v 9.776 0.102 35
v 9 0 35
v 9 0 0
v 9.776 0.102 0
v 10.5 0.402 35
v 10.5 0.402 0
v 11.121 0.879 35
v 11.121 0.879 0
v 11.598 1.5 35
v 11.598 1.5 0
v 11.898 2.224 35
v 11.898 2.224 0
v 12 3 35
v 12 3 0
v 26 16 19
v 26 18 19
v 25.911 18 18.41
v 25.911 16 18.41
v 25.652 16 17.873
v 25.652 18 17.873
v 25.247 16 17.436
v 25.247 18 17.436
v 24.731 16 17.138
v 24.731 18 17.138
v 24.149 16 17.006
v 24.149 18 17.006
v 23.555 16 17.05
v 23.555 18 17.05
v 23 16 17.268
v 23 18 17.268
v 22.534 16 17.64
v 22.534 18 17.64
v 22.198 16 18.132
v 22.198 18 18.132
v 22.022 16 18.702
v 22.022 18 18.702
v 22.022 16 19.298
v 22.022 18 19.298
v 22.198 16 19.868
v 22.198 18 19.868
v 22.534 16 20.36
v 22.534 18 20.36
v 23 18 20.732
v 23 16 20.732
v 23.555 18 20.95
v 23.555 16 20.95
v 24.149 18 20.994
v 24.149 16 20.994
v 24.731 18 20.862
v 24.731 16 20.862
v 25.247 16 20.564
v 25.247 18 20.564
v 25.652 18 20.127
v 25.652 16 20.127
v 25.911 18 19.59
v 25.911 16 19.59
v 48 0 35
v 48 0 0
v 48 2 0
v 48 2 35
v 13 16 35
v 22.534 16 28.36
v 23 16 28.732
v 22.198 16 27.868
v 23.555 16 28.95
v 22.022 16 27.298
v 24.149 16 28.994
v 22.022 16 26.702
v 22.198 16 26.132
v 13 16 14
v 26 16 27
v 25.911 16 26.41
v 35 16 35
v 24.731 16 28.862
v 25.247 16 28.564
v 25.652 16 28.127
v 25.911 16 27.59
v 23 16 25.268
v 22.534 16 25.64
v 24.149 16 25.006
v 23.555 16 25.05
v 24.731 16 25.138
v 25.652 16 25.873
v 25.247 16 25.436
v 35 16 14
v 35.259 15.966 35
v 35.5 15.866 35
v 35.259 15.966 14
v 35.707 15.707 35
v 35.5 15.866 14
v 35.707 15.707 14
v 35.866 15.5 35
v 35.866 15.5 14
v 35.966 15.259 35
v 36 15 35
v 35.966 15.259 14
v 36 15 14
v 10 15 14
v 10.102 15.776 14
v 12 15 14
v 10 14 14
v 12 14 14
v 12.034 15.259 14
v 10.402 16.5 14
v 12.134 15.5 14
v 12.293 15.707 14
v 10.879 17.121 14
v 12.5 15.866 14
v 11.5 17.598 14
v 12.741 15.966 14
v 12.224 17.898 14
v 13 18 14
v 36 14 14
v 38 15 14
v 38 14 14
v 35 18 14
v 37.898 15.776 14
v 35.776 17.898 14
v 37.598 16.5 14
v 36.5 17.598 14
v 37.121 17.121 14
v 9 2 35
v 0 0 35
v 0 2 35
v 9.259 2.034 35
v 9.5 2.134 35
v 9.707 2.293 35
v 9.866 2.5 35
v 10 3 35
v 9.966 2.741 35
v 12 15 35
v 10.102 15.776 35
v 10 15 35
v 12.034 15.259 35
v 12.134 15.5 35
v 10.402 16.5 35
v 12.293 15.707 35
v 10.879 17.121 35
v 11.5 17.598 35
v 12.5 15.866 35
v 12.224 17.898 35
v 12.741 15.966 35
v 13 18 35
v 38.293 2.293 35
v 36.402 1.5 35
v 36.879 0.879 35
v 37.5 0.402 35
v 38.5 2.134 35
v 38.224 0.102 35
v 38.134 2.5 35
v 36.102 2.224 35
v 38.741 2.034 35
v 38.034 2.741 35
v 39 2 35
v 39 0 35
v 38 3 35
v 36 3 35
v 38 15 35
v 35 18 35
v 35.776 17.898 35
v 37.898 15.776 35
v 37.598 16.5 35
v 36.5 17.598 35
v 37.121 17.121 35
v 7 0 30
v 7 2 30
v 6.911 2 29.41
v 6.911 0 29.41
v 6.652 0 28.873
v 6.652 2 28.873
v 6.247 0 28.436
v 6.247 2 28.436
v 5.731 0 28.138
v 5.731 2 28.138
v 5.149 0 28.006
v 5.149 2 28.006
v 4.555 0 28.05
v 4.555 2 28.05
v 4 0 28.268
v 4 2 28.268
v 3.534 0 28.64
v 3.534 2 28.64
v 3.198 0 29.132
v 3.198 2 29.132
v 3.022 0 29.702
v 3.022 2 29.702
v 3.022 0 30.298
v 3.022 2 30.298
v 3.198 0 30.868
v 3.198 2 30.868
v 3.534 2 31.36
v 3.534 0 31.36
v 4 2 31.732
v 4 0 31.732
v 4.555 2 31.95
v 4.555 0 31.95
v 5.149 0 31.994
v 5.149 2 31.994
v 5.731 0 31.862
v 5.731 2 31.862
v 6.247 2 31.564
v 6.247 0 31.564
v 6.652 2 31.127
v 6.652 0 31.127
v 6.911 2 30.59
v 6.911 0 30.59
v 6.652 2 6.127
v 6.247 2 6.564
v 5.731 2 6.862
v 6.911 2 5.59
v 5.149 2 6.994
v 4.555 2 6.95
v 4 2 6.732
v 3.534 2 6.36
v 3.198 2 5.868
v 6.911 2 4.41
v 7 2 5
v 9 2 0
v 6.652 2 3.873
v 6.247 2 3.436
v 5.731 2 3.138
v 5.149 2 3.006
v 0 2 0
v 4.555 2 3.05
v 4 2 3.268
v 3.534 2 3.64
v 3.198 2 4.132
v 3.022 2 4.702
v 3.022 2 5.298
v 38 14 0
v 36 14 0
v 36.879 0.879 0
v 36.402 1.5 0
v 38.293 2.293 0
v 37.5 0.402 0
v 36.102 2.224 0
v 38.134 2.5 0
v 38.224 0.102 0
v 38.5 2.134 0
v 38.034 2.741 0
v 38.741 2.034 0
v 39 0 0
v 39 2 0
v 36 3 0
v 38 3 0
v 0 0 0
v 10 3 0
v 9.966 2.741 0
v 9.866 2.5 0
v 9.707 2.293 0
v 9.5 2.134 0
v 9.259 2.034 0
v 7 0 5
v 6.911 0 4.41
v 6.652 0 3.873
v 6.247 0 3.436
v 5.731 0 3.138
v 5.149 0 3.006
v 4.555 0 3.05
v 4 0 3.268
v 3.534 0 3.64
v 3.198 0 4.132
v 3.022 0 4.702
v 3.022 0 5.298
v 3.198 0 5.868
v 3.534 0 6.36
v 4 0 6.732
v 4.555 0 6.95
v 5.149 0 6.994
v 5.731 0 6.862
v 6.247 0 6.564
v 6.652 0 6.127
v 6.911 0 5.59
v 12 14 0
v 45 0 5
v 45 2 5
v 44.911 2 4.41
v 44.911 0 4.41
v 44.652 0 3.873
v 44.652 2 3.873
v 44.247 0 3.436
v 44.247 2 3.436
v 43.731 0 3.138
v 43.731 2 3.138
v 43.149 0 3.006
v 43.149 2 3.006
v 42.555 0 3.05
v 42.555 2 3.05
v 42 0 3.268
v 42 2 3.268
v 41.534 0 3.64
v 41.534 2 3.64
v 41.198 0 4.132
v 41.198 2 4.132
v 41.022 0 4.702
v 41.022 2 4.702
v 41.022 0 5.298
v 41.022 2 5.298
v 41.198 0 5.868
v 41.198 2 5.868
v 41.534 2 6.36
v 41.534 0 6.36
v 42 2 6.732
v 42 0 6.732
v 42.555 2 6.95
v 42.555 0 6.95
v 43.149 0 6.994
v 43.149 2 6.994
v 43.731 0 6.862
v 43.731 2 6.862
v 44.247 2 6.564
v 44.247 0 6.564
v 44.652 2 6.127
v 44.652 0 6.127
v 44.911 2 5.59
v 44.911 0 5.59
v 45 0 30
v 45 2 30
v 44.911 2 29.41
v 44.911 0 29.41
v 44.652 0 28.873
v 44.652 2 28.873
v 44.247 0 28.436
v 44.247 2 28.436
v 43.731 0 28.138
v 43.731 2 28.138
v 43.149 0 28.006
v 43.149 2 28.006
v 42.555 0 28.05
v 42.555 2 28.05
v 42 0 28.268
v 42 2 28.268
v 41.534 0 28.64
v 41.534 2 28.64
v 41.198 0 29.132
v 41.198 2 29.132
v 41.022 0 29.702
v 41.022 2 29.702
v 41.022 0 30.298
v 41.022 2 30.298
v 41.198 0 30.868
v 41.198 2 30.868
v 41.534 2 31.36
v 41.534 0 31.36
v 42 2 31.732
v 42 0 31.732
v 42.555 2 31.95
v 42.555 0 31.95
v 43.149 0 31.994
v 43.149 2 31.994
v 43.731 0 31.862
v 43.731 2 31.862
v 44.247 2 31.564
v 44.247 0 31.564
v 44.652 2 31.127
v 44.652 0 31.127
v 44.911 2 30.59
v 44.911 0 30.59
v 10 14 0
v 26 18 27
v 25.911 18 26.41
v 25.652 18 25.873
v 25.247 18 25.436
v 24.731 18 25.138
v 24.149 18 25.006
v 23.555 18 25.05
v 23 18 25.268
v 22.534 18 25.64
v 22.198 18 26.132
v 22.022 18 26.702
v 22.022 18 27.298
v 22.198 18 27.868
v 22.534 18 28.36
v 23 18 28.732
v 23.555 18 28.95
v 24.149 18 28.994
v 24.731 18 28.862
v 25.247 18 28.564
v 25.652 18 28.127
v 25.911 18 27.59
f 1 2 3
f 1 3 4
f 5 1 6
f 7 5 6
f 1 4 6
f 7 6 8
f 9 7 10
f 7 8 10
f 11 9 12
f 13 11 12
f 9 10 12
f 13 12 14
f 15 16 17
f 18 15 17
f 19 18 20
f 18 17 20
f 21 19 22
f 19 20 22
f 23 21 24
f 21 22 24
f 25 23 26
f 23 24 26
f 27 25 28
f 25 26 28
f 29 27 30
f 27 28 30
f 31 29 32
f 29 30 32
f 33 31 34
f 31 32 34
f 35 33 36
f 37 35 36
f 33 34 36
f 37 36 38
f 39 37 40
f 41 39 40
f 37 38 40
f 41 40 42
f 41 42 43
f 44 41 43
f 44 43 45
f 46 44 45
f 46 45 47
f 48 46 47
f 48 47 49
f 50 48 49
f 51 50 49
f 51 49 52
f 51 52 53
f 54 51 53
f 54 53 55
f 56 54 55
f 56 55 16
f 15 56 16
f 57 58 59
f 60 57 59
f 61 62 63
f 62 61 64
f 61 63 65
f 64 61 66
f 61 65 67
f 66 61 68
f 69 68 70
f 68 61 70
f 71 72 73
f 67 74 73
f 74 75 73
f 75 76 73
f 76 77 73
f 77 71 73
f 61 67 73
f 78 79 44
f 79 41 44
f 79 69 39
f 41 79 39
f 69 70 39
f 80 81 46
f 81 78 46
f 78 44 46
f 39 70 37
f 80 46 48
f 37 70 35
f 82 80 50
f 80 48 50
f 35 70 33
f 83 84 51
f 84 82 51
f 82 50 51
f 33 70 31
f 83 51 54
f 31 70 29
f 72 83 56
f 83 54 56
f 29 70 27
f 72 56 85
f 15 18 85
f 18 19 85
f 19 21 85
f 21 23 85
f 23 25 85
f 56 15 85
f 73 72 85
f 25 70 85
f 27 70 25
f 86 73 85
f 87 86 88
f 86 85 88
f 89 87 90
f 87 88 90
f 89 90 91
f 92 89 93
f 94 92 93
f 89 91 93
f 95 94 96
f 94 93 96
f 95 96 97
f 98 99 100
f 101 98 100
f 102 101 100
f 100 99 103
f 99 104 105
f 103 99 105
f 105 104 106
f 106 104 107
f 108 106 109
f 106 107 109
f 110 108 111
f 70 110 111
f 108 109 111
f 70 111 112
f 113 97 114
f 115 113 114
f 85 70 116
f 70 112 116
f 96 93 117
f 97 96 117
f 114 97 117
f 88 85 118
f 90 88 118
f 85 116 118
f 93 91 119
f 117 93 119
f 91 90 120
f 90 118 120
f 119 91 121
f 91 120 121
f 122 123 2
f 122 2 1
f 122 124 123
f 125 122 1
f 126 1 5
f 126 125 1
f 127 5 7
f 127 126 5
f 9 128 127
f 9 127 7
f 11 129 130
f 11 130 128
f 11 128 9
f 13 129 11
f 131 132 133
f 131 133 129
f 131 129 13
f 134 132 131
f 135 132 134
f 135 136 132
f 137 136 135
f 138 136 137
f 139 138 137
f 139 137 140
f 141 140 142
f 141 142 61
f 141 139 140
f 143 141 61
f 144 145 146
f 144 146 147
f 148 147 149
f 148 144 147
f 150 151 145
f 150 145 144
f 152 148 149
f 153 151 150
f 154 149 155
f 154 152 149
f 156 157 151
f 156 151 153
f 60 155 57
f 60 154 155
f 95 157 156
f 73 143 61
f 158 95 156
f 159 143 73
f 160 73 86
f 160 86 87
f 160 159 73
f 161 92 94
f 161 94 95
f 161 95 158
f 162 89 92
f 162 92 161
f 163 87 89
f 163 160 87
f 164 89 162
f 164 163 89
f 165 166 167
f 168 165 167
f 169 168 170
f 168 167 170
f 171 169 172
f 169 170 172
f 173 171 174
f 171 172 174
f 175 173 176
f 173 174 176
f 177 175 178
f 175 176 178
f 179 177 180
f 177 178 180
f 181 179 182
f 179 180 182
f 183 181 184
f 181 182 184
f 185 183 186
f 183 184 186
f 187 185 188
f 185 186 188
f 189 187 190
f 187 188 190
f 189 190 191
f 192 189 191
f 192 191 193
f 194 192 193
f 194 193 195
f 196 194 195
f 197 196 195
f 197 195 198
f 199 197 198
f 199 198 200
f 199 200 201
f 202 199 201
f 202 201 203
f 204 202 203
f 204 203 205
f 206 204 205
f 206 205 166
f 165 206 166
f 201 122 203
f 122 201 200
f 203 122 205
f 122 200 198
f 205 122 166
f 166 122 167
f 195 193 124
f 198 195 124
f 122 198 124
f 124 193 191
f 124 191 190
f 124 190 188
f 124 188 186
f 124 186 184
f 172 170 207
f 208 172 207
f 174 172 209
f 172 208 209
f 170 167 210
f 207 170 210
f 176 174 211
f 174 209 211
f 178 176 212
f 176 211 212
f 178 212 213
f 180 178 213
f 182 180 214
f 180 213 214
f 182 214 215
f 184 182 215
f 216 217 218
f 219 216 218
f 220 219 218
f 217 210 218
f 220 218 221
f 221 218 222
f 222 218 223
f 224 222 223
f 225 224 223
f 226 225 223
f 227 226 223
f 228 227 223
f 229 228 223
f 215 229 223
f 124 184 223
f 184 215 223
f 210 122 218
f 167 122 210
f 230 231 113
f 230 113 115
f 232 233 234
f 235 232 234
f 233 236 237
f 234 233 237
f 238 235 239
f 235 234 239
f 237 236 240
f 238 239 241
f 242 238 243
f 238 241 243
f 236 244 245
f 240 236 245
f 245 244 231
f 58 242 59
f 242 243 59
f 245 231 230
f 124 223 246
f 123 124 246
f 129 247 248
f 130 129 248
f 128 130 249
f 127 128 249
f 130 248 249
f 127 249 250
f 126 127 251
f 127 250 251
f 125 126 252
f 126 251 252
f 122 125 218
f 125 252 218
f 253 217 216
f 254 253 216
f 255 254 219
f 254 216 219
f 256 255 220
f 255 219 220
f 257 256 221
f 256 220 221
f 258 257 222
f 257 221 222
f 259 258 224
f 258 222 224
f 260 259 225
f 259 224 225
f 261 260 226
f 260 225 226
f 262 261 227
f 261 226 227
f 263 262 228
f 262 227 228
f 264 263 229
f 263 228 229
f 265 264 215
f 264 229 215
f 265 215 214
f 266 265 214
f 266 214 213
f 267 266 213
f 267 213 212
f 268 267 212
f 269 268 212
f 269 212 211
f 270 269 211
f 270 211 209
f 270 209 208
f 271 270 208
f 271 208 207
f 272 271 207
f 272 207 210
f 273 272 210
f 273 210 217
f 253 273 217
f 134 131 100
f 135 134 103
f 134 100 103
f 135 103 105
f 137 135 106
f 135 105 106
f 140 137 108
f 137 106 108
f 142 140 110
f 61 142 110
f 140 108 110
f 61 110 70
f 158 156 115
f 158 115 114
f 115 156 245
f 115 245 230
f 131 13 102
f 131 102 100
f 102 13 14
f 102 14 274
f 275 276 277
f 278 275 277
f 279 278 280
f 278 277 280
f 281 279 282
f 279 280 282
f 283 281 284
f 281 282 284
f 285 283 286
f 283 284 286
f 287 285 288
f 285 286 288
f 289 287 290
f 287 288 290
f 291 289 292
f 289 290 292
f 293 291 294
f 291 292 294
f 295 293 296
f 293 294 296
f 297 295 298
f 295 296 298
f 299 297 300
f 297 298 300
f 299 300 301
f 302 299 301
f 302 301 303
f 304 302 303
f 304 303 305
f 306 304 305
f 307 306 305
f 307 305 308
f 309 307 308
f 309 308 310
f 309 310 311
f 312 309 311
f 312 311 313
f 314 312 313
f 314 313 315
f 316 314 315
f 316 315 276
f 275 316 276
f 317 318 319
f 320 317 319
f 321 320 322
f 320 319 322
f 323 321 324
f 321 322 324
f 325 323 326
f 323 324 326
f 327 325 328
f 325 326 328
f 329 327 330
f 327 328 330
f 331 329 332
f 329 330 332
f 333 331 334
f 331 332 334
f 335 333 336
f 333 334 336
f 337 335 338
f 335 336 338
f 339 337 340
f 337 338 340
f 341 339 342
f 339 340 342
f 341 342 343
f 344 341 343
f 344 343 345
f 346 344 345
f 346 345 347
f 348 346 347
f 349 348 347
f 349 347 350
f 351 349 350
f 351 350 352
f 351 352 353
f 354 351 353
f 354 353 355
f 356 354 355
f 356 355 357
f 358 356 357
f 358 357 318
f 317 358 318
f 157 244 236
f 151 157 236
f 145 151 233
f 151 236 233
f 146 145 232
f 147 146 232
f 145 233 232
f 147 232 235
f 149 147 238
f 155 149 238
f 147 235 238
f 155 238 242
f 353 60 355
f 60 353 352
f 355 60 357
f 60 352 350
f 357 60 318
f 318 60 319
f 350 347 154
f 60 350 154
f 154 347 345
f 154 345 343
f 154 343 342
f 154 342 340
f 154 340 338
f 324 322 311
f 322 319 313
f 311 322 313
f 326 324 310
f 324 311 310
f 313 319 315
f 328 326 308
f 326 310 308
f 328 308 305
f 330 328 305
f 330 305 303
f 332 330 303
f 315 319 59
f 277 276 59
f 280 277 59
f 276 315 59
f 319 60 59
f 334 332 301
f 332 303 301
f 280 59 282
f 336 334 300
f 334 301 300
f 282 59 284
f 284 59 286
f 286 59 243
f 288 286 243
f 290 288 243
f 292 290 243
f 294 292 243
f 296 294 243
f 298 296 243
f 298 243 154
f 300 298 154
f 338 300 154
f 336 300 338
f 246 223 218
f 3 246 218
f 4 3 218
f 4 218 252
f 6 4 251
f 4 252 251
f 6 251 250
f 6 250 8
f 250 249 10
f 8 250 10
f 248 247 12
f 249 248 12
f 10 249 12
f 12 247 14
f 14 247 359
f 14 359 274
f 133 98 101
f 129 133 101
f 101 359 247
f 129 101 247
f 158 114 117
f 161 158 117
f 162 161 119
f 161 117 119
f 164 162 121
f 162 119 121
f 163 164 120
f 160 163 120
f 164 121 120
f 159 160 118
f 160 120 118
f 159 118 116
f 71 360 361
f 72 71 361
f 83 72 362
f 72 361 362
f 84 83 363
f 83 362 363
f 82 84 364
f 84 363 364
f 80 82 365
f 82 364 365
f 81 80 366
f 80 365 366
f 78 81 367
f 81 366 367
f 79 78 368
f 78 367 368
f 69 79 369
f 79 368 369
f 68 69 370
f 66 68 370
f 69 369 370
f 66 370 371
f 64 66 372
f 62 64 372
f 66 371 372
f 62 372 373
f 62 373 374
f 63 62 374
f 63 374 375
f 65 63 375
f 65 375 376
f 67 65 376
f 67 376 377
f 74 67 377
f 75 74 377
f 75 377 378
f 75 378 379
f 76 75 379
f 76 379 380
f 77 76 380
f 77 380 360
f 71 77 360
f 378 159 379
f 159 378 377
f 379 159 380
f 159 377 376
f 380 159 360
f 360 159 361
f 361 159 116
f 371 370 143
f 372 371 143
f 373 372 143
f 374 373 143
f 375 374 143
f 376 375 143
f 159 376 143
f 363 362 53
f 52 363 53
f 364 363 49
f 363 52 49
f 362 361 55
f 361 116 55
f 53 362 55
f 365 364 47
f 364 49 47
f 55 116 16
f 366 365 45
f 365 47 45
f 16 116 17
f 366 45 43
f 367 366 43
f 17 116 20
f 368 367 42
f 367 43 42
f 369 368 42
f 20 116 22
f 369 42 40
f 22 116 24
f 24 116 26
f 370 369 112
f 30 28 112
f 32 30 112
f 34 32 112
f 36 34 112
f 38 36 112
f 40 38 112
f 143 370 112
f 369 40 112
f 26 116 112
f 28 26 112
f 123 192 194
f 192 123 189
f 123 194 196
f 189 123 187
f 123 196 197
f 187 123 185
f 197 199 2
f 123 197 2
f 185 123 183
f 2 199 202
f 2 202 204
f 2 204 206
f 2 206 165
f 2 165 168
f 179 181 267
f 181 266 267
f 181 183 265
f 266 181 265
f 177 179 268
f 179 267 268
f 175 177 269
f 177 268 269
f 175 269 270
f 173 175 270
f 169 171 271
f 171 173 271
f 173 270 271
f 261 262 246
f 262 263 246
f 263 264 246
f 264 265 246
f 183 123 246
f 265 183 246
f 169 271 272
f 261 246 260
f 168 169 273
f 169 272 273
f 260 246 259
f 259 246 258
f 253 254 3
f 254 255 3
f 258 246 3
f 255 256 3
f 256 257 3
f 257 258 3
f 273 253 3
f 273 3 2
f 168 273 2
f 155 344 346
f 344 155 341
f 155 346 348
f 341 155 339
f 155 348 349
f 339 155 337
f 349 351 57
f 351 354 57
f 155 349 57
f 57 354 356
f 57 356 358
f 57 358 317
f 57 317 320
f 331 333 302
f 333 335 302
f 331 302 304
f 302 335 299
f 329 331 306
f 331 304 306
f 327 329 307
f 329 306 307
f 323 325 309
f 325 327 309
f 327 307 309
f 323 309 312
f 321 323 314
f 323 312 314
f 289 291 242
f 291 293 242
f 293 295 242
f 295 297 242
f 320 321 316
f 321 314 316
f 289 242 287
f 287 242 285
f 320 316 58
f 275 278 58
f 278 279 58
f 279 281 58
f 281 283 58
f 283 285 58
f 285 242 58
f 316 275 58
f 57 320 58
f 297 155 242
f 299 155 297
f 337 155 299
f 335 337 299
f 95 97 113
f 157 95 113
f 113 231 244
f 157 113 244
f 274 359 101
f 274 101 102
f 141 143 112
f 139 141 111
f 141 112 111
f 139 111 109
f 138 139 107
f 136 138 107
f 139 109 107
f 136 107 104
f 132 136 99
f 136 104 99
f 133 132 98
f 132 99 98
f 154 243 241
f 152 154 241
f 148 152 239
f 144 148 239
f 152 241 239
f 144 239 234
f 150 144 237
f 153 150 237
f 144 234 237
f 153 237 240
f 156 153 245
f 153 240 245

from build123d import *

# Parameters (mm, degrees)
EXTRUDE_1_DEPTH     = 35
SKETCH_2_W          = 48
SKETCH_2_H          = 14
CUT_EXTRUDE_1_DEPTH = 4
SKETCH_3_R          = 2
CUT_EXTRUDE_2_DEPTH = 19


with BuildPart() as part:
    # Эскиз1 → Бобышка-Вытянуть1 (new body)
    with BuildSketch(Plane.XY):
        with BuildLine():
            Line((0, 0), (9, 0))
            ThreePointArc((9, 0), (11.121320344, 0.878679656), (12, 3))
            Line((12, 3), (12, 15))
            ThreePointArc((12, 15), (12.292893219, 15.707106781), (13, 16))
            Line((13, 16), (35, 16))
            ThreePointArc((35, 16), (35.707106781, 15.707106781), (36, 15))
            Line((36, 15), (36, 3))
            ThreePointArc((36, 3), (36.878679656, 0.878679656), (39, 0))
            Line((39, 0), (48, 0))
            Line((48, 0), (48, 2))
            Line((48, 2), (39, 2))
            ThreePointArc((39, 2), (38.292893219, 2.292893219), (38, 3))
            Line((38, 3), (38, 15))
            ThreePointArc((38, 15), (37.121320344, 17.121320344), (35, 18))
            Line((35, 18), (13, 18))
            ThreePointArc((13, 18), (10.878679656, 17.121320344), (10, 15))
            Line((10, 15), (10, 3))
            ThreePointArc((10, 3), (9.707106781, 2.292893219), (9, 2))
            Line((9, 2), (0, 2))
            Line((0, 2), (0, 0))
        make_face()
    extrude(amount=EXTRUDE_1_DEPTH)

    # Эскиз2 → Вырез-Вытянуть1 (cut)
    with BuildSketch(Plane(origin=(0, 18, 0), x_dir=(1, 0, 0), z_dir=(0, 1, 0))):
        with Locations((24, -7)):
            Rectangle(SKETCH_2_W, SKETCH_2_H)
    extrude(amount=-CUT_EXTRUDE_1_DEPTH, mode=Mode.SUBTRACT)

    # Эскиз3 → Вырез-Вытянуть2 (cut, through all)
    with BuildSketch(Plane(origin=(0, 18, 0), x_dir=(1, 0, 0), z_dir=(0, 1, 0))):
        with Locations((24, -19)):
            Circle(SKETCH_3_R)
        with Locations((24, -27)):
            Circle(SKETCH_3_R)
        with Locations((5, -30)):
            Circle(SKETCH_3_R)
        with Locations((5, -5)):
            Circle(SKETCH_3_R)
        with Locations((43, -30)):
            Circle(SKETCH_3_R)
        with Locations((43, -5)):
            Circle(SKETCH_3_R)
    extrude(amount=-CUT_EXTRUDE_2_DEPTH, mode=Mode.SUBTRACT)


solid = part.part
